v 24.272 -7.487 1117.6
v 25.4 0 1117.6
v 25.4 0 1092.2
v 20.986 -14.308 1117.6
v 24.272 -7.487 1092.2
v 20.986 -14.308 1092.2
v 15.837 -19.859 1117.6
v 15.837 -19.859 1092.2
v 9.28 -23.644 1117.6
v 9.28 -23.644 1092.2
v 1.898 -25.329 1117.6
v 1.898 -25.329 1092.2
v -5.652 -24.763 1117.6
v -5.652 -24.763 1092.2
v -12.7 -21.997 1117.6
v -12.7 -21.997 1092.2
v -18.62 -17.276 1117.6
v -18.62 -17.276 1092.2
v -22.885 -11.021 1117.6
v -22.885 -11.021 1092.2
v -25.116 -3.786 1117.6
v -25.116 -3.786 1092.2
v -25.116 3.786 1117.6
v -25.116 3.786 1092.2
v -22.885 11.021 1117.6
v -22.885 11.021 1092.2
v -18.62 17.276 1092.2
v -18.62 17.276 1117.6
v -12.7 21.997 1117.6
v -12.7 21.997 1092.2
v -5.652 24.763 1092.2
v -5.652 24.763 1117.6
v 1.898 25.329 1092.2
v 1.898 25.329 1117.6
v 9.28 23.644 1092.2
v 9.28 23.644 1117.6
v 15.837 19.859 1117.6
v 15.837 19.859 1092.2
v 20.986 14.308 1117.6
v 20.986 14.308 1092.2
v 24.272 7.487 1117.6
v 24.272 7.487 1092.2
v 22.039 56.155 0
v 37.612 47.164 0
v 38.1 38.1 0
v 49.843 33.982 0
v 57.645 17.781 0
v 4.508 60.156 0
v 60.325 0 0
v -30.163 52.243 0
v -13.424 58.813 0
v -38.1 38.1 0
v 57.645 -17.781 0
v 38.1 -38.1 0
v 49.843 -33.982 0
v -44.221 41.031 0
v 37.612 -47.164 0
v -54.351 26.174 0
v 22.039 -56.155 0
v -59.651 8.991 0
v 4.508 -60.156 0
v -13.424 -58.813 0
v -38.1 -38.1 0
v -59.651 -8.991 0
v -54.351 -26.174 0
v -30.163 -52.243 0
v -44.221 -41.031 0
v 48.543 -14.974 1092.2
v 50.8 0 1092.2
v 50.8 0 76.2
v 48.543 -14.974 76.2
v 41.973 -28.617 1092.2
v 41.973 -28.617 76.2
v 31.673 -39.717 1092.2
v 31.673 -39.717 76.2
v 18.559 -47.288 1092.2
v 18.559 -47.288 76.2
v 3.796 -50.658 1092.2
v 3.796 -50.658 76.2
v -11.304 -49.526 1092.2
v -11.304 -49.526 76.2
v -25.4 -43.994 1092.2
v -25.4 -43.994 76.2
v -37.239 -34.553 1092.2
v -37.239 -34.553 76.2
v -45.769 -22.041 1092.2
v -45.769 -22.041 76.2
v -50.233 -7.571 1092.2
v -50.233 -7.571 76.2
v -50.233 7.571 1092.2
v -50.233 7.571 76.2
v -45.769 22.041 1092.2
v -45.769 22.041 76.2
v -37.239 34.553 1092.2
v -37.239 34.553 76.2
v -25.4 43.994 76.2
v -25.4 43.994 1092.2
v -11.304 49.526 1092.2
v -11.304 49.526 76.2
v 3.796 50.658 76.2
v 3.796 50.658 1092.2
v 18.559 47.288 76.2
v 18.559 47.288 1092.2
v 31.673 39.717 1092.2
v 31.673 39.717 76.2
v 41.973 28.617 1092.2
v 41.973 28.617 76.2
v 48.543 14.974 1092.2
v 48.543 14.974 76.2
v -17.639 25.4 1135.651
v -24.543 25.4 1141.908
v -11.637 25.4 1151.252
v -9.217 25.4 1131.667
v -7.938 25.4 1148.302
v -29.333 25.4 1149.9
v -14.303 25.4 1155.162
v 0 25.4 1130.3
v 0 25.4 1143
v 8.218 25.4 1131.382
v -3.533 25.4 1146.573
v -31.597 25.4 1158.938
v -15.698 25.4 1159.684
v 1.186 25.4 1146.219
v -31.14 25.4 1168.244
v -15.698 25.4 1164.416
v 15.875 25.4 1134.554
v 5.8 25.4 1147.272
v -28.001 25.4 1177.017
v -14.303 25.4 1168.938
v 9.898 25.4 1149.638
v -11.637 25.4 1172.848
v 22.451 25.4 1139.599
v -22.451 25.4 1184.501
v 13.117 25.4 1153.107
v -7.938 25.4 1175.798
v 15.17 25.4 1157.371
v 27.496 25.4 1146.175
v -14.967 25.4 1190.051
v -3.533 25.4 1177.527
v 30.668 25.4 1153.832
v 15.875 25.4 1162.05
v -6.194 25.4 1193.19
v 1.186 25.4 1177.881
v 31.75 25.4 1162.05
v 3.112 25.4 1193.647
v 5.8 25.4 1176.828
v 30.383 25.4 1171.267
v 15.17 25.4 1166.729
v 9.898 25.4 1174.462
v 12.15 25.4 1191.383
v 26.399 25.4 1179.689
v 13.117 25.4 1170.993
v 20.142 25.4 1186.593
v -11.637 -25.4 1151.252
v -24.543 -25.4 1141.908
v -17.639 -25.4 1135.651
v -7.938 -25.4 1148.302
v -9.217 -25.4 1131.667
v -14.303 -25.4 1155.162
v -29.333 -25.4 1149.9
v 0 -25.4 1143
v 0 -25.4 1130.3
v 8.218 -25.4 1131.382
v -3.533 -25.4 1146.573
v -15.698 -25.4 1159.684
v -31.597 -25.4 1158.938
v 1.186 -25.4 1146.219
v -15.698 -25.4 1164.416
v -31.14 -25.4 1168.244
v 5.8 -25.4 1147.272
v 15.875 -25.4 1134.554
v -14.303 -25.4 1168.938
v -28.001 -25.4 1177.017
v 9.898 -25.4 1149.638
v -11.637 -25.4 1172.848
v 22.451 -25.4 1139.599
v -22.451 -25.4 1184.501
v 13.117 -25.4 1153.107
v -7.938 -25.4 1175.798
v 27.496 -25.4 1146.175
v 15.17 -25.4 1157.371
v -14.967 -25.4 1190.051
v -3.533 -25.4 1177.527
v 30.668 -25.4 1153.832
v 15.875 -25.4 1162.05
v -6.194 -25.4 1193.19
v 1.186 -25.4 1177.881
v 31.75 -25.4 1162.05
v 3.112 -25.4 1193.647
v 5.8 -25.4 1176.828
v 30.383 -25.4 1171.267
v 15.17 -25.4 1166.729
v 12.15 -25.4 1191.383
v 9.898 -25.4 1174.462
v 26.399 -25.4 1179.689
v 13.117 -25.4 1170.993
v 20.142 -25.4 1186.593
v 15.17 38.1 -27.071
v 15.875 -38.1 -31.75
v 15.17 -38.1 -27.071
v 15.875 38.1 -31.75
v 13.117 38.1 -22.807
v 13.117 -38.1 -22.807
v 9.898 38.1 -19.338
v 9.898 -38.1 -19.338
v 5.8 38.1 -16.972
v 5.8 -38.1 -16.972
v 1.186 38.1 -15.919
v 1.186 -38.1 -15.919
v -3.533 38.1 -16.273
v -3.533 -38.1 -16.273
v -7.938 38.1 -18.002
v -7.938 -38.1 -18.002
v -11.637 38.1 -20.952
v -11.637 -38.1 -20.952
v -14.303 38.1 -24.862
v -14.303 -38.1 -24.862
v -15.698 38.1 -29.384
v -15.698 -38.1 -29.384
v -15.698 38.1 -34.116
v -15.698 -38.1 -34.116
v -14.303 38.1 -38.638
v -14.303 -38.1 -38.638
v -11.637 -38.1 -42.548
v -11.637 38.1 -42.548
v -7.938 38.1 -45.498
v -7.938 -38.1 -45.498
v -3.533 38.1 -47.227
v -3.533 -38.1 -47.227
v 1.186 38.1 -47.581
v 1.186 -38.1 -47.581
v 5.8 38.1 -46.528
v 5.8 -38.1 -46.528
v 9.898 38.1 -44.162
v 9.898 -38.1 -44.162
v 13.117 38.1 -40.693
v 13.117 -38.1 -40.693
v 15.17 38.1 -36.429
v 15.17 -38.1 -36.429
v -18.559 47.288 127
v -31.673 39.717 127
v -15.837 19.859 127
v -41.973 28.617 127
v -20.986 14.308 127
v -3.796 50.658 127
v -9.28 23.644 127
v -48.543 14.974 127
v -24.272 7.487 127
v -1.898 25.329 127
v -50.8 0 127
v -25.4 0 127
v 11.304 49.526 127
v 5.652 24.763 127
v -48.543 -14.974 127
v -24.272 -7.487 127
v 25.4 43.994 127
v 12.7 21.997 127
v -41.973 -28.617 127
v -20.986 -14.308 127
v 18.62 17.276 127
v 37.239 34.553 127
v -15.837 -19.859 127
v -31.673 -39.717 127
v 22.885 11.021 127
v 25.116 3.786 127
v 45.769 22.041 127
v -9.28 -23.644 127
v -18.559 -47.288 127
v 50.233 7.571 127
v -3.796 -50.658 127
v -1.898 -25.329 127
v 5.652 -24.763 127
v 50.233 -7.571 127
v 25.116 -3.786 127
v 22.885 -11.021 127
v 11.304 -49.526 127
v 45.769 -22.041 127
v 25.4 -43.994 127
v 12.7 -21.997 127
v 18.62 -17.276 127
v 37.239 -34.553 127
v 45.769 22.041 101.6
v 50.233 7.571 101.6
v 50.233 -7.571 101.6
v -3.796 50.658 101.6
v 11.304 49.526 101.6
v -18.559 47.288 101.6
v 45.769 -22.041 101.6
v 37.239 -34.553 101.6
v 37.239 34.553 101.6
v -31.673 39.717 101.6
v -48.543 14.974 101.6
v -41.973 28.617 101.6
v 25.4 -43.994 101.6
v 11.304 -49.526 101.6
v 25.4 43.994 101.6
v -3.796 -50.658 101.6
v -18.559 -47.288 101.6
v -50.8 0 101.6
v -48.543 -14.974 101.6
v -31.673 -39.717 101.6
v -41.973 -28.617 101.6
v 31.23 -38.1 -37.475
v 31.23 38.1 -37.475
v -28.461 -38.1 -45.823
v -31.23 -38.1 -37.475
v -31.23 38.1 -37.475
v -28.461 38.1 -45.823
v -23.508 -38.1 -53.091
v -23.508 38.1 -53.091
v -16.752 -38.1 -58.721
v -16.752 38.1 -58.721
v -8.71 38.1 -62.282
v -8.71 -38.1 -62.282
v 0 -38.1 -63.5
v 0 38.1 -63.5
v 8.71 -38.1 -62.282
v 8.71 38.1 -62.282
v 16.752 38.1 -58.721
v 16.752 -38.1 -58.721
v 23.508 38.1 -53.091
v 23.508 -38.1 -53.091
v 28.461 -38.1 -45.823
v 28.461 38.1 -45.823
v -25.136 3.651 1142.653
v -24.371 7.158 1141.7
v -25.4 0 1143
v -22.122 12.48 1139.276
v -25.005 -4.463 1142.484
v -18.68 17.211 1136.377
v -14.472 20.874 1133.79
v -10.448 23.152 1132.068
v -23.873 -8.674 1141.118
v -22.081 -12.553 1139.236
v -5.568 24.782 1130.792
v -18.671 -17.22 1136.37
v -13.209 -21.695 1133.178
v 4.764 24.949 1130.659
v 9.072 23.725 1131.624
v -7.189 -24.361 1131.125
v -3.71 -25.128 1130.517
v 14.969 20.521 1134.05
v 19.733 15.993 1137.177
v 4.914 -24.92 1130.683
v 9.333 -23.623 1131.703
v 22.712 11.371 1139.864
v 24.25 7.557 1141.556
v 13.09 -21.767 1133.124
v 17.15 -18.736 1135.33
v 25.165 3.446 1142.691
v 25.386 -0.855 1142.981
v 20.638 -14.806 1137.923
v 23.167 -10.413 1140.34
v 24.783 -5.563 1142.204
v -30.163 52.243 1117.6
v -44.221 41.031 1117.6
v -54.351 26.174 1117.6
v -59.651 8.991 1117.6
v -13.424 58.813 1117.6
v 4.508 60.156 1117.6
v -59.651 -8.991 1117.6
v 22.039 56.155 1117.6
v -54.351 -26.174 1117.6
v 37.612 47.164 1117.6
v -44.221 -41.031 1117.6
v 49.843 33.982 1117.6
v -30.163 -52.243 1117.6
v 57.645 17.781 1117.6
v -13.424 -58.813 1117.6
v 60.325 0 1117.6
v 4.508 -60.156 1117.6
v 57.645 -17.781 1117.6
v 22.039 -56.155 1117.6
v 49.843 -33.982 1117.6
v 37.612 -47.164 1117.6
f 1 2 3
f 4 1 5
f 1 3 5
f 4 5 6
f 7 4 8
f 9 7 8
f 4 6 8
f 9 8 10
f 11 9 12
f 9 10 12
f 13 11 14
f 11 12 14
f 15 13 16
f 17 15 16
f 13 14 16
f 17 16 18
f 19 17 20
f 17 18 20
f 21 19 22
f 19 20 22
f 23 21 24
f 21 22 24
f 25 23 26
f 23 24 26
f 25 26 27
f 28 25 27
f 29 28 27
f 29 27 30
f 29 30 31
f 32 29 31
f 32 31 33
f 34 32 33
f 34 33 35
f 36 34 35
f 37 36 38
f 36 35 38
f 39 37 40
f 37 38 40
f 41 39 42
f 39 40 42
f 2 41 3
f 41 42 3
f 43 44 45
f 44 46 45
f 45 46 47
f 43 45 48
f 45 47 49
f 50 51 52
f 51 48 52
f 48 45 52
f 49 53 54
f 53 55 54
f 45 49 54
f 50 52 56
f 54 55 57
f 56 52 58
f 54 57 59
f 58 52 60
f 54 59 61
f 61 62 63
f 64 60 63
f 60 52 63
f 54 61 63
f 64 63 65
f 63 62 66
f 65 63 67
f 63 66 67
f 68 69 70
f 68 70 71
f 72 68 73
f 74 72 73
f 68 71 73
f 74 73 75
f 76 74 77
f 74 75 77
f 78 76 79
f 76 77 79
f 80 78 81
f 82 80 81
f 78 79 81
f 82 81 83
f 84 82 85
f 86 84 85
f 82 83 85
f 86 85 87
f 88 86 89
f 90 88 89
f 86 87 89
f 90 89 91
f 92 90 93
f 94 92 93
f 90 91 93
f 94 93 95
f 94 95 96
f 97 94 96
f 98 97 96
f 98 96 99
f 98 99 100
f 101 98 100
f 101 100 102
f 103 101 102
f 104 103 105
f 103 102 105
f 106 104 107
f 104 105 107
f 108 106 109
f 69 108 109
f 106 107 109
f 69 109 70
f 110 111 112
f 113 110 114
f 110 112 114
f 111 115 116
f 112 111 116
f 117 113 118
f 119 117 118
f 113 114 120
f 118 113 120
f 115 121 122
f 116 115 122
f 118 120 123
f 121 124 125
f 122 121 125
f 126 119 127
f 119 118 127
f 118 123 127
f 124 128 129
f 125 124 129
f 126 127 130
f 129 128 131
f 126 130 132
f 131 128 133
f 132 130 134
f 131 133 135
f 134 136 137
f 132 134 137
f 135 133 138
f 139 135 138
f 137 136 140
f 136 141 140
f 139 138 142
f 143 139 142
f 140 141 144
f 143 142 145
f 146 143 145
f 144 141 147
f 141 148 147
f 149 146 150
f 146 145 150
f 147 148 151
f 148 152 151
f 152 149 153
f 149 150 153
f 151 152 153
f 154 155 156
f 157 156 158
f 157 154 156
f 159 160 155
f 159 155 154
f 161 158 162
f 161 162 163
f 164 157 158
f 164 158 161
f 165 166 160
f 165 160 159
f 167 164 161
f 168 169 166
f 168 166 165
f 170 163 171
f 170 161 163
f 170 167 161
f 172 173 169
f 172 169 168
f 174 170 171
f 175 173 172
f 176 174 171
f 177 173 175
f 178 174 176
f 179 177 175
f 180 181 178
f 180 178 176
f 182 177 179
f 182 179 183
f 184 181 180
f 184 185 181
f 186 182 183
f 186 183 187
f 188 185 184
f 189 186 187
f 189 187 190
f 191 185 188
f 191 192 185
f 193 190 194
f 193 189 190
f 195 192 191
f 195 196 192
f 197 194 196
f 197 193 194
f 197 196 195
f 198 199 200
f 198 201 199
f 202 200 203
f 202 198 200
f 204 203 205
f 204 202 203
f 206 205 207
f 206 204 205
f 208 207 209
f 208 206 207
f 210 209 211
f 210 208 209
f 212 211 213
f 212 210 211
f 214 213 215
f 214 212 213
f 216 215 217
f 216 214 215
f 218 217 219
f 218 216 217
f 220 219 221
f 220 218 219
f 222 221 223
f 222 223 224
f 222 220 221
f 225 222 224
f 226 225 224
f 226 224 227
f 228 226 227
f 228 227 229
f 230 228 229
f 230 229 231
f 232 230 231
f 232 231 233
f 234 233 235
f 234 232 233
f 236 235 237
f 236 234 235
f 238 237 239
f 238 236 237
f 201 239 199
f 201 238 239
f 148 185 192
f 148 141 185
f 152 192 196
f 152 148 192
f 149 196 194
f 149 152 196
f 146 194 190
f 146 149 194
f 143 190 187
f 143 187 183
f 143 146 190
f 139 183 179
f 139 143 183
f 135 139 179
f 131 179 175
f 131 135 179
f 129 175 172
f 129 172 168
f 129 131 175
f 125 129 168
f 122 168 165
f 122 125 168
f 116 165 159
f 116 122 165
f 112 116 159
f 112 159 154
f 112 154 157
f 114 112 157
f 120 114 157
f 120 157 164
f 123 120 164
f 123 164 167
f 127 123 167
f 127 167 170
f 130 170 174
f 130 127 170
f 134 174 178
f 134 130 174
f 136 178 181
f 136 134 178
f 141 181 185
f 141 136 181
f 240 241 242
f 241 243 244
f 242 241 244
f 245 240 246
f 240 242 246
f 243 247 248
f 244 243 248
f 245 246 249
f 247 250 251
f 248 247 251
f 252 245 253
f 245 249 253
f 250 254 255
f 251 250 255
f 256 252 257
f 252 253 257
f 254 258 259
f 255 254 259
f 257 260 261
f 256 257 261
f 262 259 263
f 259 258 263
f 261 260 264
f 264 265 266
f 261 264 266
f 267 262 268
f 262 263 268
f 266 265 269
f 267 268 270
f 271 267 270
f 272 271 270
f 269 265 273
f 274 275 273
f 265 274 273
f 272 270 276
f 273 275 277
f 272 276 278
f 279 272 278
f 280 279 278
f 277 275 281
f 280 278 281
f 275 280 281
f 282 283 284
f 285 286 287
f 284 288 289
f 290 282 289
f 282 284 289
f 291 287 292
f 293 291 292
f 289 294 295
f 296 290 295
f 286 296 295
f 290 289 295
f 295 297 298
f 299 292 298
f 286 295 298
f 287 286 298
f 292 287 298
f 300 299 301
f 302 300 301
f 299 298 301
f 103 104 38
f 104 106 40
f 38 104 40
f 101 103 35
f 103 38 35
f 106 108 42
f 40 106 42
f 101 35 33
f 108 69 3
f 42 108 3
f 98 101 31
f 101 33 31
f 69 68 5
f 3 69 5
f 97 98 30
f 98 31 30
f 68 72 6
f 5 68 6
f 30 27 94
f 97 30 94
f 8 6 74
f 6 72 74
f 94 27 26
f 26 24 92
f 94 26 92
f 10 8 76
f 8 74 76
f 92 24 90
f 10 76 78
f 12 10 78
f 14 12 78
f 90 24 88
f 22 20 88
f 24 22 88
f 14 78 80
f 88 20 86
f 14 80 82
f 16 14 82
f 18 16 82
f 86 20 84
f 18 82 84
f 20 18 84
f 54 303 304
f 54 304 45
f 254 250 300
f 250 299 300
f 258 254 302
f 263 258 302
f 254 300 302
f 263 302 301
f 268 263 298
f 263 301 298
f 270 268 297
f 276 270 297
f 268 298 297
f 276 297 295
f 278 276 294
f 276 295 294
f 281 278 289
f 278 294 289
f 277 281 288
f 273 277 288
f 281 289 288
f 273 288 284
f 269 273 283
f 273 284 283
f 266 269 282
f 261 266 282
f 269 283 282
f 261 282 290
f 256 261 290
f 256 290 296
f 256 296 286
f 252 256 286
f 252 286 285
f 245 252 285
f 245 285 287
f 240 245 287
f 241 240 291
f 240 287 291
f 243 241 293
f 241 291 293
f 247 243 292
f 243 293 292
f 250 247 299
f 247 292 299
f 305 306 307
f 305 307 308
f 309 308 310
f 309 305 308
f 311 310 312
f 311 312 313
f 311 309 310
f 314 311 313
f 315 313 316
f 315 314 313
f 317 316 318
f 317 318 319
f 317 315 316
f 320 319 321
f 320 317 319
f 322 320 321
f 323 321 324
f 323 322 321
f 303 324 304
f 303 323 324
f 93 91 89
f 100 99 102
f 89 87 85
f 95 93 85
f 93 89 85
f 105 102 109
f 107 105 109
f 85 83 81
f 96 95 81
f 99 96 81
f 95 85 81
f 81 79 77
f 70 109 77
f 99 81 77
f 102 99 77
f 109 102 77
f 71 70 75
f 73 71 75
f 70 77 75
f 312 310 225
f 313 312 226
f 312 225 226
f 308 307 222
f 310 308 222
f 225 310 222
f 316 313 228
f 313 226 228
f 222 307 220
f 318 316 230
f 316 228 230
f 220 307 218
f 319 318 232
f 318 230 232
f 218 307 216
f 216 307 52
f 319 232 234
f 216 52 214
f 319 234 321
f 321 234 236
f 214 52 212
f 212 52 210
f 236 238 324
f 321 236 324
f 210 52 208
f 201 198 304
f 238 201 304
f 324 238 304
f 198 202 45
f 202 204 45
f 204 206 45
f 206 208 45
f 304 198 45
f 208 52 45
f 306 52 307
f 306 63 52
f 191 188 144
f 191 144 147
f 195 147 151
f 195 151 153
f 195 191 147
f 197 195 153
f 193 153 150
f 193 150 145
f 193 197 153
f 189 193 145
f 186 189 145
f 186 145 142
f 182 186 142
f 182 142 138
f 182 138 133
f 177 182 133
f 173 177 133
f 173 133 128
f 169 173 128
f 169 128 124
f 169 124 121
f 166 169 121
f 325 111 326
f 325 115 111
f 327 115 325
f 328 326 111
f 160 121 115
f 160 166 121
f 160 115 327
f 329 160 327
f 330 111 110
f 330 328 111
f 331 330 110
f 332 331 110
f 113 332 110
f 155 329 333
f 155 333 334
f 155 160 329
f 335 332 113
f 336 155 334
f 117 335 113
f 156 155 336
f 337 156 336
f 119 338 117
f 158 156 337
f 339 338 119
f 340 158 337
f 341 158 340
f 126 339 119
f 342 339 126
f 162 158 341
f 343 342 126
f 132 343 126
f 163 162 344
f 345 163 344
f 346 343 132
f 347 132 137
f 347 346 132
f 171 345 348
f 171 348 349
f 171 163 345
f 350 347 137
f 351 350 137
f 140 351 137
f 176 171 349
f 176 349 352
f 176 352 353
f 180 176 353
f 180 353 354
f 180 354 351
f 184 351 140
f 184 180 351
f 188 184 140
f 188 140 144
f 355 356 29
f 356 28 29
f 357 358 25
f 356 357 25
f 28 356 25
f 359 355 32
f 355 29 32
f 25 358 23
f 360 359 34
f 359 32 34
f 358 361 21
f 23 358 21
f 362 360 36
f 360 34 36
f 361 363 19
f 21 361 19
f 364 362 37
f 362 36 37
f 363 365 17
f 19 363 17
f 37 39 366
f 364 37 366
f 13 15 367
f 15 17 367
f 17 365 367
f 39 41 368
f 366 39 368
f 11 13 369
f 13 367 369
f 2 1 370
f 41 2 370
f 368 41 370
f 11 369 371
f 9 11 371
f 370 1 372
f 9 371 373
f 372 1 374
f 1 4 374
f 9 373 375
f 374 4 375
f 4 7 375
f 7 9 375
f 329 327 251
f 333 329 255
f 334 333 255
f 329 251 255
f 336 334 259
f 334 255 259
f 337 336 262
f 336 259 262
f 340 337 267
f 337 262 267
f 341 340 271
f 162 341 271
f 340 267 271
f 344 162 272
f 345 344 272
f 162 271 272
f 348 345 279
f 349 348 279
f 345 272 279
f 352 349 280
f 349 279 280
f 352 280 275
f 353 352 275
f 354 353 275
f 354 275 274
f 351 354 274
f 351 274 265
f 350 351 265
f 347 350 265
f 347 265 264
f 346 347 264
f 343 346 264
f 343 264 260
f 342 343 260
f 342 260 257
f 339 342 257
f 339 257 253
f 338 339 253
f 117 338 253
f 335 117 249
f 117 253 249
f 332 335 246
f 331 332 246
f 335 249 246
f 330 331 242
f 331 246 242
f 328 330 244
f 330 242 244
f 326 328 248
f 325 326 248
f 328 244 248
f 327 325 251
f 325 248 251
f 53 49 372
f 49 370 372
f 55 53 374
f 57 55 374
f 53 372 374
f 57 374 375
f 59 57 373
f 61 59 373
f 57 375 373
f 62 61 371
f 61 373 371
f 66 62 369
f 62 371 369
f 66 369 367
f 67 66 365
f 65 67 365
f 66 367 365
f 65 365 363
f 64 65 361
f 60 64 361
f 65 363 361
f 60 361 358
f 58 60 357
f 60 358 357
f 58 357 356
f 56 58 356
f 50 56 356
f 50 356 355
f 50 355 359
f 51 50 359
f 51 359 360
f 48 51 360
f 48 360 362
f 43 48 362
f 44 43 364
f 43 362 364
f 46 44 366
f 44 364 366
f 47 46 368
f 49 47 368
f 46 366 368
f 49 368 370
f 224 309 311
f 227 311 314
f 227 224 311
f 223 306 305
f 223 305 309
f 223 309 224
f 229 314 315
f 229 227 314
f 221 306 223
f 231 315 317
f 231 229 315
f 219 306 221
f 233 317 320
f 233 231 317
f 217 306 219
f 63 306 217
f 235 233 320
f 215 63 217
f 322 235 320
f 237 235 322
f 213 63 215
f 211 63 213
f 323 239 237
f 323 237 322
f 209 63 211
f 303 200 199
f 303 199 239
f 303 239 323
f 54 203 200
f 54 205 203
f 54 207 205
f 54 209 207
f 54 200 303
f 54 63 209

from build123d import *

# Parameters (mm, degrees)
F2_R     = 15.875
F3_DEPTH = 38.1
F6_R     = 31.75
F6_R_2   = 15.875
F7_DEPTH = 25.4


with BuildPart() as f1:
    # F0 (on Front) → F1 (revolve)
    with BuildSketch(Plane.XZ):
        Polygon((60.325, 0), (60.325, 1117.6), (25.4, 1117.6), (25.4, 1092.2), (50.8, 1092.2), (50.8, 76.2), (0, 76.2), (0, 0), align=None)
    revolve(axis=Axis((0, 0, 38.1), (0, 0, -1)))

    # F2 (on Front) → F3 (join, symmetric)
    with BuildSketch(Plane.XZ):
        with BuildLine():
            Line((-38.1, 0), (-31.229508, -37.47541))
            ThreePointArc((-31.229508, -37.47541), (0, -63.5), (31.229508, -37.47541))
            Line((31.229508, -37.47541), (38.1, 0))
            Line((38.1, 0), (-38.1, 0))
        make_face()
        with Locations((0, -31.75)):
            Circle(F2_R, mode=Mode.SUBTRACT)
    extrude(amount=F3_DEPTH, both=True)


with BuildPart() as f5:
    # F4 (on Front) → F5 (revolve)
    with BuildSketch(Plane.XZ):
        Polygon((0, 1143), (-25.4, 1143), (-25.4, 127), (-50.8, 127), (-50.8, 101.6), (0, 101.6), align=None)
    revolve(axis=Axis((0, 0, 622.3), (0, 0, 1)))

    # F6 (on Front) → F7 (join, symmetric)
    with BuildSketch(Plane.XZ):
        with Locations((0, 1162.05)):
            Circle(F6_R)
        with Locations((0, 1162.05)):
            Circle(F6_R_2, mode=Mode.SUBTRACT)
    extrude(amount=F7_DEPTH, both=True)


with BuildPart() as f8_1:
    # F8: copy of F1
    add(f1.part)


solid = Compound([f1.part, f5.part])
